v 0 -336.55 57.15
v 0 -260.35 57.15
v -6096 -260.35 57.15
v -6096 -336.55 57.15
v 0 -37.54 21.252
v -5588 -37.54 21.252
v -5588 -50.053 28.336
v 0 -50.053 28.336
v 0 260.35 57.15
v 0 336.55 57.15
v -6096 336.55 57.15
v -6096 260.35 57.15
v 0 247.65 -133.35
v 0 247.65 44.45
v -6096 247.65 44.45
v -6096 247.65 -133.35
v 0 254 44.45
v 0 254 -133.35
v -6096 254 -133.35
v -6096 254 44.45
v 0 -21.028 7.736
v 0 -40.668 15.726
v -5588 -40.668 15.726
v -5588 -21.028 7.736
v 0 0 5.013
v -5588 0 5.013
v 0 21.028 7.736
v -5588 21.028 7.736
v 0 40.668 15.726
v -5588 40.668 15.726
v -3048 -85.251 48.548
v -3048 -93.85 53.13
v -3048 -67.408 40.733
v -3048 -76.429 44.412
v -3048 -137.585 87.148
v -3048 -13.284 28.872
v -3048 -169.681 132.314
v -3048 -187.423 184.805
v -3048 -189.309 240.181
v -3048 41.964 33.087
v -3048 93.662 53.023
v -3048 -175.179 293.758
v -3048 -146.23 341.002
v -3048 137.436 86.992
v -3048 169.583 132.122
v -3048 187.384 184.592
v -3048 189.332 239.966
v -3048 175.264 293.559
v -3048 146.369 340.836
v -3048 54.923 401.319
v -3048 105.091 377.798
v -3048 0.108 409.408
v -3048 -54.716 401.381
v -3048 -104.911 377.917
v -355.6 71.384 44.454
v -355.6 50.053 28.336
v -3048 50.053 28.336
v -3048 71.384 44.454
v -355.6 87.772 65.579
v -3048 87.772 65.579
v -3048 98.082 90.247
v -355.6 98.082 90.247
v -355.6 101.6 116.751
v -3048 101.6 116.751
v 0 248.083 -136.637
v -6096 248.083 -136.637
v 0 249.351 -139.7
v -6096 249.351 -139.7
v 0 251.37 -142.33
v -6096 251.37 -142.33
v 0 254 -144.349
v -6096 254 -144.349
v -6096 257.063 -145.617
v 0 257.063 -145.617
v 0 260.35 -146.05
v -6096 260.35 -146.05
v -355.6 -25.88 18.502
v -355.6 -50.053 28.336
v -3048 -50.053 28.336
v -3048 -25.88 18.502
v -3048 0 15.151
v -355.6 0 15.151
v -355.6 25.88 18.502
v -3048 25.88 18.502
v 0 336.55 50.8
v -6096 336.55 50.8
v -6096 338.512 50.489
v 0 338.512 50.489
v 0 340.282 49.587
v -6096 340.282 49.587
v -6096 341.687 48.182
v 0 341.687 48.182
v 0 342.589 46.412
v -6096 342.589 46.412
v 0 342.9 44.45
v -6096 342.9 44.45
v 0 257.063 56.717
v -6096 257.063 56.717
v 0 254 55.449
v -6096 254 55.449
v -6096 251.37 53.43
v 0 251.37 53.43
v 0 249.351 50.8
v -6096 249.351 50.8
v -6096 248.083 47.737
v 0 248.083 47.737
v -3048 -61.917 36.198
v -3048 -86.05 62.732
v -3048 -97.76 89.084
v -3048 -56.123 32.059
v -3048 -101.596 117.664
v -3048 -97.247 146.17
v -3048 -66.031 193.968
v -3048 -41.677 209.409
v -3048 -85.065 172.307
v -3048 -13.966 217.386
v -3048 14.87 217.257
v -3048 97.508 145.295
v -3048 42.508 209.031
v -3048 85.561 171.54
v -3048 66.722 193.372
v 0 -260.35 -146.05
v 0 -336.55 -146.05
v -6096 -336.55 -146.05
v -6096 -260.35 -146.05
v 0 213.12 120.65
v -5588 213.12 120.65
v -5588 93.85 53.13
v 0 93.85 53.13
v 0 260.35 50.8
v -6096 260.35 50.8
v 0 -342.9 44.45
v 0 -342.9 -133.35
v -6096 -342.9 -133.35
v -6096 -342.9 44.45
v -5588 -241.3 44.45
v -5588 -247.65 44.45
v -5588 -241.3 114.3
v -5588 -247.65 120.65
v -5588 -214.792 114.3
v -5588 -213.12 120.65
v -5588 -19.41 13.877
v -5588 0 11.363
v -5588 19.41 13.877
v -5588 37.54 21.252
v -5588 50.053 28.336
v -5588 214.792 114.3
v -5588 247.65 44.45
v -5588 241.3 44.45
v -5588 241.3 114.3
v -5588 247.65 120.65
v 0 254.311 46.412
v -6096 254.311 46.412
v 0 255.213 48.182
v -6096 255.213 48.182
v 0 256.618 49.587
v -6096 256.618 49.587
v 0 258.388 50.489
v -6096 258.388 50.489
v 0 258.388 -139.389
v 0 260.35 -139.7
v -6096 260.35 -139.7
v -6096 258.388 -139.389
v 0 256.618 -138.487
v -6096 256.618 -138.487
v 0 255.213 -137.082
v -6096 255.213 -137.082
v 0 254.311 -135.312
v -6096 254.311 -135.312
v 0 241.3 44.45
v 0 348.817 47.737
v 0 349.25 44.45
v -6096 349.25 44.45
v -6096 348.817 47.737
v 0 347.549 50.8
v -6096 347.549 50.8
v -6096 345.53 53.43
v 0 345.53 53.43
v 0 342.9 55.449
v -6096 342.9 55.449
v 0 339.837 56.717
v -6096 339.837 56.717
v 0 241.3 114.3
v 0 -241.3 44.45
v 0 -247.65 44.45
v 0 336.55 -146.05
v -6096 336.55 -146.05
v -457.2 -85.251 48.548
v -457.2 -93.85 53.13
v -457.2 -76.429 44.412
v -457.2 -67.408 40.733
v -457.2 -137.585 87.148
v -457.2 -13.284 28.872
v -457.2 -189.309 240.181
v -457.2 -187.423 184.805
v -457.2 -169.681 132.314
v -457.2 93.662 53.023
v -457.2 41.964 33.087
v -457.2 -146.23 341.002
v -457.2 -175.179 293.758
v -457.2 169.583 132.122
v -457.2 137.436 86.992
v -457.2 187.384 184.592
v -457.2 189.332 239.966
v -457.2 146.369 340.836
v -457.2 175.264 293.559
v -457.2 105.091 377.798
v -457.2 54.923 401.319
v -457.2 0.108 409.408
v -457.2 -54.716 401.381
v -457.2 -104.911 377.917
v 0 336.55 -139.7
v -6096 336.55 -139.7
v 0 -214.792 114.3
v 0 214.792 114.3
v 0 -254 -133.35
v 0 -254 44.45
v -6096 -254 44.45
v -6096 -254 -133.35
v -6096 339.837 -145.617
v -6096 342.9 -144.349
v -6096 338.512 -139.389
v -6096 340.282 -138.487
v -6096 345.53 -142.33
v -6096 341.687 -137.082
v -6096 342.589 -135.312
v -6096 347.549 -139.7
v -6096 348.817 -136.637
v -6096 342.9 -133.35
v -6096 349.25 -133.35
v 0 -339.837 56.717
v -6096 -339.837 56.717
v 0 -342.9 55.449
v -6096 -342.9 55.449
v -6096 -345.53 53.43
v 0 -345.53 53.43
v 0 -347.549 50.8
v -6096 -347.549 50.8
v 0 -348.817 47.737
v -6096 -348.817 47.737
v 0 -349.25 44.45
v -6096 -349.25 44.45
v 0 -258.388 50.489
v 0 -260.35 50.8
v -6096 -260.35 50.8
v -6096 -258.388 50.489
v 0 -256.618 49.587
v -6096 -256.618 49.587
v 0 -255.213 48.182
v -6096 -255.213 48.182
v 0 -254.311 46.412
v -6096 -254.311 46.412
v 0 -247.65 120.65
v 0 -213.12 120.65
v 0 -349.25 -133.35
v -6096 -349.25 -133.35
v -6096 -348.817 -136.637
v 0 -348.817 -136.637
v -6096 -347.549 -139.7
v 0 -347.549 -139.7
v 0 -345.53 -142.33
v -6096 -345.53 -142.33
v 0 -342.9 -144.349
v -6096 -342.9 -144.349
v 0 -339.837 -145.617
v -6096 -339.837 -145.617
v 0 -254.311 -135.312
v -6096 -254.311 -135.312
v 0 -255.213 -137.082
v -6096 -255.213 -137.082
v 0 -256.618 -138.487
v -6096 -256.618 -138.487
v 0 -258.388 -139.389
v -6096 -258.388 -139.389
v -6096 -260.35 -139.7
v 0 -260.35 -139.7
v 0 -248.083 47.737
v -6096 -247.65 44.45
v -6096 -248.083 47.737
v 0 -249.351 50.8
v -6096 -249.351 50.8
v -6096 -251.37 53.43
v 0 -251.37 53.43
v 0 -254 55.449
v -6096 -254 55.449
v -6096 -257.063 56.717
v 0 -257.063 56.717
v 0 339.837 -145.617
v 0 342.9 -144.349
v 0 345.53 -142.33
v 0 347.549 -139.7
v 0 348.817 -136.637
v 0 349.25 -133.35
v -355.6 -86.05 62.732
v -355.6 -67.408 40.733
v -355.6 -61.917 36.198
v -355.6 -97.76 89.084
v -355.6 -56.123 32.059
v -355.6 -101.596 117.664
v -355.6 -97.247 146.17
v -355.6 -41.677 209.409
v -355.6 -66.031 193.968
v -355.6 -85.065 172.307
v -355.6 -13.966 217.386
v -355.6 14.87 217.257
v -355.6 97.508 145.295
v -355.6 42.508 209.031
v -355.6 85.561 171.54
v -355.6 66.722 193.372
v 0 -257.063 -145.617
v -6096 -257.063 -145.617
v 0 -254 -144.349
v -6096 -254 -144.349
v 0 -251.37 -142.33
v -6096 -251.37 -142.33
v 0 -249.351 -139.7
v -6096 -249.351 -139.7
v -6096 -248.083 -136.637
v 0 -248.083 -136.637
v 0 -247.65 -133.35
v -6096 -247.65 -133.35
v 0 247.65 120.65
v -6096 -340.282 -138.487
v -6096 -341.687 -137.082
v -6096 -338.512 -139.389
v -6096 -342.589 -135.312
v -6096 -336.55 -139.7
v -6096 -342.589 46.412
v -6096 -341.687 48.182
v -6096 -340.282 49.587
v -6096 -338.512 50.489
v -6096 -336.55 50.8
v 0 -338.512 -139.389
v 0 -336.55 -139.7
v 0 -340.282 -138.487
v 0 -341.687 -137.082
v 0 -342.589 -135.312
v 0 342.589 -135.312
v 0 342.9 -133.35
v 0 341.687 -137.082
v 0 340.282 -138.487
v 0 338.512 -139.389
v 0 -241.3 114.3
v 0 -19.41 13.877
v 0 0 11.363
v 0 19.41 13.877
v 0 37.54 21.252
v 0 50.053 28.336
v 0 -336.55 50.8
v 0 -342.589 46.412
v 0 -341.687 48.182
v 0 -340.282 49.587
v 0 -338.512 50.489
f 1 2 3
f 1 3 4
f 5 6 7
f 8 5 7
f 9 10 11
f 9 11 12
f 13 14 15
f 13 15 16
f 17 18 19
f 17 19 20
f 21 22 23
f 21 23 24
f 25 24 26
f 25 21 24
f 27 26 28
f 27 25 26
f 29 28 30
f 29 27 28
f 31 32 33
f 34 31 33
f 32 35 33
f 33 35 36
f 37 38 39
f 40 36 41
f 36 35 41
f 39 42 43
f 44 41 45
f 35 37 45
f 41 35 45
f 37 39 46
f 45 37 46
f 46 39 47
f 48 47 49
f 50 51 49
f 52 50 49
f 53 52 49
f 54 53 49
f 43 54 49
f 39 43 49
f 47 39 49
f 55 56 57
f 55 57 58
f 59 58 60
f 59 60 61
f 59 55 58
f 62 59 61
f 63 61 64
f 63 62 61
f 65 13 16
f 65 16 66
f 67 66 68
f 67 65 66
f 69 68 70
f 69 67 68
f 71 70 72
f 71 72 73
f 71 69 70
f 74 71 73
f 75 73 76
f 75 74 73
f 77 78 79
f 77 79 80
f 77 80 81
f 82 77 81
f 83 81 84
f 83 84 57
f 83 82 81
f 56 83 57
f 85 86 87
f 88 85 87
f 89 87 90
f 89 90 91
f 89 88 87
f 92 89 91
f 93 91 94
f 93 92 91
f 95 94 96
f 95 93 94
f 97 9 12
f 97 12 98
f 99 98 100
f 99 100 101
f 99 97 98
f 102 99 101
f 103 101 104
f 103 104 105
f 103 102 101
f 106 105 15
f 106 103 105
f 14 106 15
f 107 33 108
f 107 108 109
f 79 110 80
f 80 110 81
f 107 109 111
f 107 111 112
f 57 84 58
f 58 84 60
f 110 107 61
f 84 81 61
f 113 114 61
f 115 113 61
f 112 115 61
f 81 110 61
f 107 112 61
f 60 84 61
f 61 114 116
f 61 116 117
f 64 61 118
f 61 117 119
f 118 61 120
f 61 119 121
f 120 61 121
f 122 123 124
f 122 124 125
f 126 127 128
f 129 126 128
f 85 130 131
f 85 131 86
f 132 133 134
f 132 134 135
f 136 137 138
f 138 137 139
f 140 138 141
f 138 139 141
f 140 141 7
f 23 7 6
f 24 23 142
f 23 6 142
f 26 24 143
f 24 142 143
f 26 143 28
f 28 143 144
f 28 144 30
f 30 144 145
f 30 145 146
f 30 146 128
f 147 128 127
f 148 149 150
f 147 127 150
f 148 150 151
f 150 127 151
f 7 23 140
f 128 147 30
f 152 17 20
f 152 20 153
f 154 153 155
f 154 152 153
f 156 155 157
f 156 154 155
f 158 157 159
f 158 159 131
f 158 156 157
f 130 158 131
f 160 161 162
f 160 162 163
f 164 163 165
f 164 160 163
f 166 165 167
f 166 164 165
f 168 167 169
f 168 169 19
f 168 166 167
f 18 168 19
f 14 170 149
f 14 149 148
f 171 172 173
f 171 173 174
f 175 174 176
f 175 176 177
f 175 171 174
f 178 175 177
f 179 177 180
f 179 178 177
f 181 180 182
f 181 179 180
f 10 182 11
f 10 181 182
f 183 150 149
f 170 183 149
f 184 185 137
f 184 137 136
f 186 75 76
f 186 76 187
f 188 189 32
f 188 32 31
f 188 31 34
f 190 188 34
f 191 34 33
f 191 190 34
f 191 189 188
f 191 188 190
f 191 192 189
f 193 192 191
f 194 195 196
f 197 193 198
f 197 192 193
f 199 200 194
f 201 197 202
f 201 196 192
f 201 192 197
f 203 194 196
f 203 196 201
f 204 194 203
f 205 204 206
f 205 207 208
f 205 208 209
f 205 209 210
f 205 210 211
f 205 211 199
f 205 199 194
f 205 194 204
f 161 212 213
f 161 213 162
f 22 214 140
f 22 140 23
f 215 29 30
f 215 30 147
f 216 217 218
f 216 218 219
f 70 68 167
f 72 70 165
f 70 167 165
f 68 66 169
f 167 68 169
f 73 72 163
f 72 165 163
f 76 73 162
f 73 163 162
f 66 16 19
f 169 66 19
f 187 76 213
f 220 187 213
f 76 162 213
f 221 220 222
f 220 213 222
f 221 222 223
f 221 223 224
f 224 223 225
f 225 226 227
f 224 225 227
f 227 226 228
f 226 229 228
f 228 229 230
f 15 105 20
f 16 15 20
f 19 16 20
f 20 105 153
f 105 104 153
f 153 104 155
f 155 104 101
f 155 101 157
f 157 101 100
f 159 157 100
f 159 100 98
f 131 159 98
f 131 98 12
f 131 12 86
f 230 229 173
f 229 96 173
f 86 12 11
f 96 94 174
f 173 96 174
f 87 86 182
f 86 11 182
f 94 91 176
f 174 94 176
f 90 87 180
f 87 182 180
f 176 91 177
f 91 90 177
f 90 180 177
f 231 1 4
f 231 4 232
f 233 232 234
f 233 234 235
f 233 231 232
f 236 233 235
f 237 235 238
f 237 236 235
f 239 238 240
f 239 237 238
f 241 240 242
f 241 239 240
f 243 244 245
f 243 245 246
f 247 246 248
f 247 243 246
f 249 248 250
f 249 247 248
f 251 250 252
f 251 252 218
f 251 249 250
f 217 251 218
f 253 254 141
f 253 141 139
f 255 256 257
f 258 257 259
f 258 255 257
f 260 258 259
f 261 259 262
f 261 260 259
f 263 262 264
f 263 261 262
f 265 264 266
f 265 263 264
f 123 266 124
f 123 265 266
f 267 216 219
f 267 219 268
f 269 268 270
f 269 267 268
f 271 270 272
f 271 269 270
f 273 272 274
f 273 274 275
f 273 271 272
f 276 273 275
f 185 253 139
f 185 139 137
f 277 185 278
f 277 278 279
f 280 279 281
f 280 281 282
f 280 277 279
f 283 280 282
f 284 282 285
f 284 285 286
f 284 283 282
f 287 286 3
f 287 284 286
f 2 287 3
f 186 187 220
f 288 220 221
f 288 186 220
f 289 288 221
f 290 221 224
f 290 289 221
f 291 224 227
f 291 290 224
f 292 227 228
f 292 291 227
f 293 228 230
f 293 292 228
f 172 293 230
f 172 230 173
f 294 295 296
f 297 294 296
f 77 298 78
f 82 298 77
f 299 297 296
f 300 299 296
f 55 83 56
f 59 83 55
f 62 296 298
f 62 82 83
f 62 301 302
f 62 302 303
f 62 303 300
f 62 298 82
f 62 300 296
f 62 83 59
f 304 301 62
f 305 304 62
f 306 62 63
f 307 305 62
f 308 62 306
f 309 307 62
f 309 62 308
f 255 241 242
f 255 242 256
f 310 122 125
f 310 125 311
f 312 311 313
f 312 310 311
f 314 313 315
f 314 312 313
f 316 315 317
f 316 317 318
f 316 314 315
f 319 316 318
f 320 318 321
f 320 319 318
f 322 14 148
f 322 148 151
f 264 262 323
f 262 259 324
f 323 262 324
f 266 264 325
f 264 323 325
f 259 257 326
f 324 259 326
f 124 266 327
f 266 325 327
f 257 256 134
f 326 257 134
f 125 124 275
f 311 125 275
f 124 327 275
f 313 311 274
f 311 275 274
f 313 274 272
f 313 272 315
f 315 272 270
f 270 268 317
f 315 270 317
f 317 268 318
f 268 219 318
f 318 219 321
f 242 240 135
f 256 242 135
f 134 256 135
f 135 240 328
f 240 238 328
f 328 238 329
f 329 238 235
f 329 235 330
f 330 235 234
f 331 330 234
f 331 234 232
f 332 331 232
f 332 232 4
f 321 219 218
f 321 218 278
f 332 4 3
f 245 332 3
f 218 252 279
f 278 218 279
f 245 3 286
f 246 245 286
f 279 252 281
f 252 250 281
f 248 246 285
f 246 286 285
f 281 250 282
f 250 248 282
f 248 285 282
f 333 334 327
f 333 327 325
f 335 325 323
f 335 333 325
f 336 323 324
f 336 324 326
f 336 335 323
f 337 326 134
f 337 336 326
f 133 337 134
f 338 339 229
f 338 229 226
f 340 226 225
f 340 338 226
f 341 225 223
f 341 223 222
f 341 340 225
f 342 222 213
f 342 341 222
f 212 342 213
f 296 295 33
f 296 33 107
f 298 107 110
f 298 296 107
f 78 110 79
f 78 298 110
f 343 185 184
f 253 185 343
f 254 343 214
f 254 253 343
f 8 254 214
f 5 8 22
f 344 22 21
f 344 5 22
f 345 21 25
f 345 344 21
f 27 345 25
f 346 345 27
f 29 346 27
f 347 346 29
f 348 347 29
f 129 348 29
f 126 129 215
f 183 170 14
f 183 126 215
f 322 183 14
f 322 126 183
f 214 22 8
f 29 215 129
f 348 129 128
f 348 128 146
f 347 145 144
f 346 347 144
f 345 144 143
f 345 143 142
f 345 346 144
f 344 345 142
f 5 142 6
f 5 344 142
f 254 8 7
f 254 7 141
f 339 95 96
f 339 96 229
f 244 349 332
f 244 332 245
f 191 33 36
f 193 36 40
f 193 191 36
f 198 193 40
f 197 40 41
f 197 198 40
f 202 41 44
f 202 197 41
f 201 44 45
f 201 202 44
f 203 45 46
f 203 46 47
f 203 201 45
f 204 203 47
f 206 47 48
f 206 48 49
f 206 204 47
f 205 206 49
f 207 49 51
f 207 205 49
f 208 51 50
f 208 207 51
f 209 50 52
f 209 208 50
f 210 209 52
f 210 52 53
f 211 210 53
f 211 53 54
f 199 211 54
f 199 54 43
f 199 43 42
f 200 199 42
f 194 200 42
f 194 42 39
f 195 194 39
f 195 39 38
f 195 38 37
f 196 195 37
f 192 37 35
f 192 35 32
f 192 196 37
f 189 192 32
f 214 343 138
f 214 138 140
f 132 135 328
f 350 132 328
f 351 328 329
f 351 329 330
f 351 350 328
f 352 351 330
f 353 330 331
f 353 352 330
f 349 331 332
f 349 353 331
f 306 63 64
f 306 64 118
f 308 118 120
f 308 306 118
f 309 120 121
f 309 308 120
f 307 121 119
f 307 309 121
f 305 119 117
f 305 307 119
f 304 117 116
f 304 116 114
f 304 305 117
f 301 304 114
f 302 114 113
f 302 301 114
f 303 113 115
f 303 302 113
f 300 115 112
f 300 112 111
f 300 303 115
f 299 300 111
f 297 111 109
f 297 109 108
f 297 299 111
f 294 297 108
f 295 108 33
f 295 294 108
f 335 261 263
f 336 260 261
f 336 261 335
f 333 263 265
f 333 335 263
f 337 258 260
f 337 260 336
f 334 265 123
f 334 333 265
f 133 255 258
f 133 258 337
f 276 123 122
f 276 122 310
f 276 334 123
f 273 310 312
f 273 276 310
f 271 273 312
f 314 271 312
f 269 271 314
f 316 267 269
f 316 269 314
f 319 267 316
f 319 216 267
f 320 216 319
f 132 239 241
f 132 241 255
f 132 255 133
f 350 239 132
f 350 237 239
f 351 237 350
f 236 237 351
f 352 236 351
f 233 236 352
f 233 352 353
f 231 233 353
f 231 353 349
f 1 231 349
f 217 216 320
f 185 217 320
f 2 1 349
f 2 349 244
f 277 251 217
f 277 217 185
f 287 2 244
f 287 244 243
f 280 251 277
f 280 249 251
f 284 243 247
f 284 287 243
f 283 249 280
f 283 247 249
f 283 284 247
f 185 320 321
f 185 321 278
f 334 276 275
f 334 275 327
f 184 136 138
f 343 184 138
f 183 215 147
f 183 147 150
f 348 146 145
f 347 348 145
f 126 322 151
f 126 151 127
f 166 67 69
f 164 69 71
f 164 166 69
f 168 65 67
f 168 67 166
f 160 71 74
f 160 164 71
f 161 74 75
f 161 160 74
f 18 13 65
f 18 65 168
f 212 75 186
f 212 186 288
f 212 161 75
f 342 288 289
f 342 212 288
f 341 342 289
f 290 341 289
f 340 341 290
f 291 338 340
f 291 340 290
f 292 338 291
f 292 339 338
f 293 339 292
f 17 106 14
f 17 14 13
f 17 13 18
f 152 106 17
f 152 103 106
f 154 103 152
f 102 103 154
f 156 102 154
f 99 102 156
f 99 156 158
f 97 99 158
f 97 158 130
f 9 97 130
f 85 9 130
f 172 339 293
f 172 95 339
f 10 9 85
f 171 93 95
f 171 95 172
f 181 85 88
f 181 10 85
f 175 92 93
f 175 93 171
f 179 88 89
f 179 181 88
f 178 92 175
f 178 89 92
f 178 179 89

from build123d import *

# Parameters (mm, degrees)
F1_DEPTH = 6096
F2_DEPTH = 5588
F3_START = -355.6
F3_DEPTH = 2692.4
F4_START = -457.2
F4_DEPTH = 2590.8


# Not quite as in the source:
# - a feature names something its author has since deleted; it is built from what else it names


with BuildPart() as f1:
    # F0 (on Right) → F1 (new body)
    with BuildSketch(Plane.YZ):
        with BuildLine():
            Line((-278.751844046, 57.15), (-336.55, 57.15))
            ThreePointArc((-336.55, 57.15), (-345.5302561211, 53.4302561211), (-349.25, 44.45))
            Line((-349.25, 44.45), (-349.25, -133.35))
            ThreePointArc((-349.25, -133.35), (-345.5302561211, -142.3302561211), (-336.55, -146.05))
            Line((-336.55, -146.05), (-260.35, -146.05))
            ThreePointArc((-260.35, -146.05), (-251.3697438789, -142.3302561211), (-247.65, -133.35))
            Line((-247.65, -133.35), (-247.65, 44.45))
            ThreePointArc((-247.65, 44.45), (-251.3697438789, 53.4302561211), (-260.35, 57.15))
            Line((-260.35, 57.15), (-268.1402802436, 57.15))
            Line((-268.1402802436, 57.15), (-269.3472818438, 57.15))
            Line((-269.3472818438, 57.15), (-278.751844046, 57.15))
        make_face()
        with BuildLine():
            ThreePointArc((-342.9, 44.45), (-341.0401280605, 48.9401280605), (-336.55, 50.8))
            Line((-336.55, 50.8), (-260.35, 50.8))
            ThreePointArc((-260.35, 50.8), (-255.8598719395, 48.9401280605), (-254, 44.45))
            Line((-254, 44.45), (-254, -133.35))
            ThreePointArc((-254, -133.35), (-255.8598719395, -137.8401280605), (-260.35, -139.7))
            Line((-260.35, -139.7), (-336.55, -139.7))
            ThreePointArc((-336.55, -139.7), (-341.0401280605, -137.8401280605), (-342.9, -133.35))
            Line((-342.9, -133.35), (-342.9, 44.45))
        make_face(mode=Mode.SUBTRACT)
    extrude(amount=-F1_DEPTH)


with BuildPart() as f1b:
    # F0 (on Right) → F1, piece 2 (new body)
    with BuildSketch(Plane.YZ):
        with BuildLine():
            ThreePointArc((260.35, 57.15), (251.3697438789, 53.4302561211), (247.65, 44.45))
            Line((247.65, 44.45), (247.65, -133.35))
            ThreePointArc((247.65, -133.35), (251.3697438789, -142.3302561211), (260.35, -146.05))
            Line((260.35, -146.05), (336.55, -146.05))
            ThreePointArc((336.55, -146.05), (345.5302561211, -142.3302561211), (349.25, -133.35))
            Line((349.25, -133.35), (349.25, 44.45))
            ThreePointArc((349.25, 44.45), (345.5302561211, 53.4302561211), (336.55, 57.15))
            Line((336.55, 57.15), (260.35, 57.15))
        make_face()
        with BuildLine():
            Line((260.35, 50.8), (336.55, 50.8))
            ThreePointArc((336.55, 50.8), (341.0401280605, 48.9401280605), (342.9, 44.45))
            Line((342.9, 44.45), (342.9, -133.35))
            ThreePointArc((342.9, -133.35), (341.0401280605, -137.8401280605), (336.55, -139.7))
            Line((336.55, -139.7), (260.35, -139.7))
            ThreePointArc((260.35, -139.7), (255.8598719395, -137.8401280605), (254, -133.35))
            Line((254, -133.35), (254, 44.45))
            ThreePointArc((254, 44.45), (255.8598719395, 48.9401280605), (260.35, 50.8))
        make_face(mode=Mode.SUBTRACT)
    extrude(amount=-F1_DEPTH)


with BuildPart() as f2:
    # F0 (on Right) → F2 (new body)
    with BuildSketch(Plane.YZ):
        with BuildLine():
            Line((-247.65, 120.65), (-247.65, 44.45))
            Line((-247.65, 44.45), (-241.3, 44.45))
            Line((-241.3, 44.45), (-241.3, 114.3))
            Line((-241.3, 114.3), (-214.7923633436, 114.3))
            Line((-214.7923633436, 114.3), (-40.6681247176, 15.7258547021))
            ThreePointArc((-40.6681247176, 15.7258547021), (0, 5.0132135897), (40.6681247176, 15.7258547021))
            Line((40.6681247176, 15.7258547021), (214.7923633436, 114.3))
            Line((214.7923633436, 114.3), (241.3, 114.3))
            Line((241.3, 114.3), (241.3, 44.45))
            Line((241.3, 44.45), (247.65, 44.45))
            Line((247.65, 44.45), (247.65, 120.65))
            Line((247.65, 120.65), (213.1196707487, 120.65))
            Line((213.1196707487, 120.65), (93.8495232493, 53.1295161083))
            Line((93.8495232493, 53.1295161083), (50.0530768875, 28.3357406909))
            Line((50.0530768875, 28.3357406909), (37.5398074317, 21.2518053858))
            ThreePointArc((37.5398074317, 21.2518053858), (0, 11.3632135897), (-37.5398074317, 21.2518053858))
            Line((-37.5398074317, 21.2518053858), (-50.0530764944, 28.3357404684))
            Line((-50.0530764944, 28.3357404684), (-93.8495233688, 53.1295161759))
            Line((-93.8495233688, 53.1295161759), (-213.1196707487, 120.65))
            Line((-213.1196707487, 120.65), (-247.65, 120.65))
        make_face()
    extrude(amount=-F2_DEPTH)


with BuildPart() as f3:
    # F0 (on Right) → F3 (new body)
    with BuildSketch(Plane.YZ.offset(F3_START)):
        with BuildLine():
            ThreePointArc((-67.4075244001, 40.7326269894), (-59.0564889701, 34.0775511932), (-50.0530764944, 28.3357404684))
            ThreePointArc((-50.0530764944, 28.3357404684), (2.258e-07, 15.150951453), (50.0530768875, 28.3357406909))
            ThreePointArc((50.0530768875, 28.3357406909), (59.0564891539, 34.0775513244), (67.4075244001, 40.7326269894))
            ThreePointArc((67.4075244001, 40.7326269894), (0, 28.4080339743), (-67.4075244001, 40.7326269894))
        make_face()
        with BuildLine():
            ThreePointArc((101.6, 116.750951453), (-41.6770651615, 209.4093684453), (-67.4075244001, 40.7326269894))
            ThreePointArc((-67.4075244001, 40.7326269894), (0, 28.4080339743), (67.4075244001, 40.7326269894))
            ThreePointArc((67.4075244001, 40.7326269894), (92.6584169923, 75.0738862915), (101.6, 116.750951453))
        make_face()
    extrude(amount=-F3_DEPTH)


with BuildPart() as f4:
    # F0 (on Right) → F4 (new body)
    with BuildSketch(Plane.YZ.offset(F4_START)):
        with BuildLine():
            ThreePointArc((190.5, 218.9080339743), (-95.9476831358, 383.4810940446), (-93.8495233688, 53.1295161759))
            ThreePointArc((-93.8495233688, 53.1295161759), (-80.8664304836, 46.4236276622), (-67.4075244001, 40.7326269894))
            ThreePointArc((-67.4075244001, 40.7326269894), (-41.6770651615, 209.4093684453), (101.6, 116.750951453))
            ThreePointArc((101.6, 116.750951453), (92.6584169923, 75.0738862915), (67.4075244001, 40.7326269894))
            ThreePointArc((67.4075244001, 40.7326269894), (80.8664304214, 46.4236276331), (93.8495232493, 53.1295161083))
            ThreePointArc((93.8495232493, 53.1295161083), (164.5730600356, 122.9603507793), (190.5, 218.9080339743))
        make_face()
        with BuildLine():
            ThreePointArc((101.6, 116.750951453), (-41.6770651615, 209.4093684453), (-67.4075244001, 40.7326269894))
            ThreePointArc((-67.4075244001, 40.7326269894), (0, 28.4080339743), (67.4075244001, 40.7326269894))
            ThreePointArc((67.4075244001, 40.7326269894), (92.6584169923, 75.0738862915), (101.6, 116.750951453))
        make_face()
    extrude(amount=-F4_DEPTH)


solid = Compound([f1.part, f1b.part, f2.part, f3.part, f4.part])
